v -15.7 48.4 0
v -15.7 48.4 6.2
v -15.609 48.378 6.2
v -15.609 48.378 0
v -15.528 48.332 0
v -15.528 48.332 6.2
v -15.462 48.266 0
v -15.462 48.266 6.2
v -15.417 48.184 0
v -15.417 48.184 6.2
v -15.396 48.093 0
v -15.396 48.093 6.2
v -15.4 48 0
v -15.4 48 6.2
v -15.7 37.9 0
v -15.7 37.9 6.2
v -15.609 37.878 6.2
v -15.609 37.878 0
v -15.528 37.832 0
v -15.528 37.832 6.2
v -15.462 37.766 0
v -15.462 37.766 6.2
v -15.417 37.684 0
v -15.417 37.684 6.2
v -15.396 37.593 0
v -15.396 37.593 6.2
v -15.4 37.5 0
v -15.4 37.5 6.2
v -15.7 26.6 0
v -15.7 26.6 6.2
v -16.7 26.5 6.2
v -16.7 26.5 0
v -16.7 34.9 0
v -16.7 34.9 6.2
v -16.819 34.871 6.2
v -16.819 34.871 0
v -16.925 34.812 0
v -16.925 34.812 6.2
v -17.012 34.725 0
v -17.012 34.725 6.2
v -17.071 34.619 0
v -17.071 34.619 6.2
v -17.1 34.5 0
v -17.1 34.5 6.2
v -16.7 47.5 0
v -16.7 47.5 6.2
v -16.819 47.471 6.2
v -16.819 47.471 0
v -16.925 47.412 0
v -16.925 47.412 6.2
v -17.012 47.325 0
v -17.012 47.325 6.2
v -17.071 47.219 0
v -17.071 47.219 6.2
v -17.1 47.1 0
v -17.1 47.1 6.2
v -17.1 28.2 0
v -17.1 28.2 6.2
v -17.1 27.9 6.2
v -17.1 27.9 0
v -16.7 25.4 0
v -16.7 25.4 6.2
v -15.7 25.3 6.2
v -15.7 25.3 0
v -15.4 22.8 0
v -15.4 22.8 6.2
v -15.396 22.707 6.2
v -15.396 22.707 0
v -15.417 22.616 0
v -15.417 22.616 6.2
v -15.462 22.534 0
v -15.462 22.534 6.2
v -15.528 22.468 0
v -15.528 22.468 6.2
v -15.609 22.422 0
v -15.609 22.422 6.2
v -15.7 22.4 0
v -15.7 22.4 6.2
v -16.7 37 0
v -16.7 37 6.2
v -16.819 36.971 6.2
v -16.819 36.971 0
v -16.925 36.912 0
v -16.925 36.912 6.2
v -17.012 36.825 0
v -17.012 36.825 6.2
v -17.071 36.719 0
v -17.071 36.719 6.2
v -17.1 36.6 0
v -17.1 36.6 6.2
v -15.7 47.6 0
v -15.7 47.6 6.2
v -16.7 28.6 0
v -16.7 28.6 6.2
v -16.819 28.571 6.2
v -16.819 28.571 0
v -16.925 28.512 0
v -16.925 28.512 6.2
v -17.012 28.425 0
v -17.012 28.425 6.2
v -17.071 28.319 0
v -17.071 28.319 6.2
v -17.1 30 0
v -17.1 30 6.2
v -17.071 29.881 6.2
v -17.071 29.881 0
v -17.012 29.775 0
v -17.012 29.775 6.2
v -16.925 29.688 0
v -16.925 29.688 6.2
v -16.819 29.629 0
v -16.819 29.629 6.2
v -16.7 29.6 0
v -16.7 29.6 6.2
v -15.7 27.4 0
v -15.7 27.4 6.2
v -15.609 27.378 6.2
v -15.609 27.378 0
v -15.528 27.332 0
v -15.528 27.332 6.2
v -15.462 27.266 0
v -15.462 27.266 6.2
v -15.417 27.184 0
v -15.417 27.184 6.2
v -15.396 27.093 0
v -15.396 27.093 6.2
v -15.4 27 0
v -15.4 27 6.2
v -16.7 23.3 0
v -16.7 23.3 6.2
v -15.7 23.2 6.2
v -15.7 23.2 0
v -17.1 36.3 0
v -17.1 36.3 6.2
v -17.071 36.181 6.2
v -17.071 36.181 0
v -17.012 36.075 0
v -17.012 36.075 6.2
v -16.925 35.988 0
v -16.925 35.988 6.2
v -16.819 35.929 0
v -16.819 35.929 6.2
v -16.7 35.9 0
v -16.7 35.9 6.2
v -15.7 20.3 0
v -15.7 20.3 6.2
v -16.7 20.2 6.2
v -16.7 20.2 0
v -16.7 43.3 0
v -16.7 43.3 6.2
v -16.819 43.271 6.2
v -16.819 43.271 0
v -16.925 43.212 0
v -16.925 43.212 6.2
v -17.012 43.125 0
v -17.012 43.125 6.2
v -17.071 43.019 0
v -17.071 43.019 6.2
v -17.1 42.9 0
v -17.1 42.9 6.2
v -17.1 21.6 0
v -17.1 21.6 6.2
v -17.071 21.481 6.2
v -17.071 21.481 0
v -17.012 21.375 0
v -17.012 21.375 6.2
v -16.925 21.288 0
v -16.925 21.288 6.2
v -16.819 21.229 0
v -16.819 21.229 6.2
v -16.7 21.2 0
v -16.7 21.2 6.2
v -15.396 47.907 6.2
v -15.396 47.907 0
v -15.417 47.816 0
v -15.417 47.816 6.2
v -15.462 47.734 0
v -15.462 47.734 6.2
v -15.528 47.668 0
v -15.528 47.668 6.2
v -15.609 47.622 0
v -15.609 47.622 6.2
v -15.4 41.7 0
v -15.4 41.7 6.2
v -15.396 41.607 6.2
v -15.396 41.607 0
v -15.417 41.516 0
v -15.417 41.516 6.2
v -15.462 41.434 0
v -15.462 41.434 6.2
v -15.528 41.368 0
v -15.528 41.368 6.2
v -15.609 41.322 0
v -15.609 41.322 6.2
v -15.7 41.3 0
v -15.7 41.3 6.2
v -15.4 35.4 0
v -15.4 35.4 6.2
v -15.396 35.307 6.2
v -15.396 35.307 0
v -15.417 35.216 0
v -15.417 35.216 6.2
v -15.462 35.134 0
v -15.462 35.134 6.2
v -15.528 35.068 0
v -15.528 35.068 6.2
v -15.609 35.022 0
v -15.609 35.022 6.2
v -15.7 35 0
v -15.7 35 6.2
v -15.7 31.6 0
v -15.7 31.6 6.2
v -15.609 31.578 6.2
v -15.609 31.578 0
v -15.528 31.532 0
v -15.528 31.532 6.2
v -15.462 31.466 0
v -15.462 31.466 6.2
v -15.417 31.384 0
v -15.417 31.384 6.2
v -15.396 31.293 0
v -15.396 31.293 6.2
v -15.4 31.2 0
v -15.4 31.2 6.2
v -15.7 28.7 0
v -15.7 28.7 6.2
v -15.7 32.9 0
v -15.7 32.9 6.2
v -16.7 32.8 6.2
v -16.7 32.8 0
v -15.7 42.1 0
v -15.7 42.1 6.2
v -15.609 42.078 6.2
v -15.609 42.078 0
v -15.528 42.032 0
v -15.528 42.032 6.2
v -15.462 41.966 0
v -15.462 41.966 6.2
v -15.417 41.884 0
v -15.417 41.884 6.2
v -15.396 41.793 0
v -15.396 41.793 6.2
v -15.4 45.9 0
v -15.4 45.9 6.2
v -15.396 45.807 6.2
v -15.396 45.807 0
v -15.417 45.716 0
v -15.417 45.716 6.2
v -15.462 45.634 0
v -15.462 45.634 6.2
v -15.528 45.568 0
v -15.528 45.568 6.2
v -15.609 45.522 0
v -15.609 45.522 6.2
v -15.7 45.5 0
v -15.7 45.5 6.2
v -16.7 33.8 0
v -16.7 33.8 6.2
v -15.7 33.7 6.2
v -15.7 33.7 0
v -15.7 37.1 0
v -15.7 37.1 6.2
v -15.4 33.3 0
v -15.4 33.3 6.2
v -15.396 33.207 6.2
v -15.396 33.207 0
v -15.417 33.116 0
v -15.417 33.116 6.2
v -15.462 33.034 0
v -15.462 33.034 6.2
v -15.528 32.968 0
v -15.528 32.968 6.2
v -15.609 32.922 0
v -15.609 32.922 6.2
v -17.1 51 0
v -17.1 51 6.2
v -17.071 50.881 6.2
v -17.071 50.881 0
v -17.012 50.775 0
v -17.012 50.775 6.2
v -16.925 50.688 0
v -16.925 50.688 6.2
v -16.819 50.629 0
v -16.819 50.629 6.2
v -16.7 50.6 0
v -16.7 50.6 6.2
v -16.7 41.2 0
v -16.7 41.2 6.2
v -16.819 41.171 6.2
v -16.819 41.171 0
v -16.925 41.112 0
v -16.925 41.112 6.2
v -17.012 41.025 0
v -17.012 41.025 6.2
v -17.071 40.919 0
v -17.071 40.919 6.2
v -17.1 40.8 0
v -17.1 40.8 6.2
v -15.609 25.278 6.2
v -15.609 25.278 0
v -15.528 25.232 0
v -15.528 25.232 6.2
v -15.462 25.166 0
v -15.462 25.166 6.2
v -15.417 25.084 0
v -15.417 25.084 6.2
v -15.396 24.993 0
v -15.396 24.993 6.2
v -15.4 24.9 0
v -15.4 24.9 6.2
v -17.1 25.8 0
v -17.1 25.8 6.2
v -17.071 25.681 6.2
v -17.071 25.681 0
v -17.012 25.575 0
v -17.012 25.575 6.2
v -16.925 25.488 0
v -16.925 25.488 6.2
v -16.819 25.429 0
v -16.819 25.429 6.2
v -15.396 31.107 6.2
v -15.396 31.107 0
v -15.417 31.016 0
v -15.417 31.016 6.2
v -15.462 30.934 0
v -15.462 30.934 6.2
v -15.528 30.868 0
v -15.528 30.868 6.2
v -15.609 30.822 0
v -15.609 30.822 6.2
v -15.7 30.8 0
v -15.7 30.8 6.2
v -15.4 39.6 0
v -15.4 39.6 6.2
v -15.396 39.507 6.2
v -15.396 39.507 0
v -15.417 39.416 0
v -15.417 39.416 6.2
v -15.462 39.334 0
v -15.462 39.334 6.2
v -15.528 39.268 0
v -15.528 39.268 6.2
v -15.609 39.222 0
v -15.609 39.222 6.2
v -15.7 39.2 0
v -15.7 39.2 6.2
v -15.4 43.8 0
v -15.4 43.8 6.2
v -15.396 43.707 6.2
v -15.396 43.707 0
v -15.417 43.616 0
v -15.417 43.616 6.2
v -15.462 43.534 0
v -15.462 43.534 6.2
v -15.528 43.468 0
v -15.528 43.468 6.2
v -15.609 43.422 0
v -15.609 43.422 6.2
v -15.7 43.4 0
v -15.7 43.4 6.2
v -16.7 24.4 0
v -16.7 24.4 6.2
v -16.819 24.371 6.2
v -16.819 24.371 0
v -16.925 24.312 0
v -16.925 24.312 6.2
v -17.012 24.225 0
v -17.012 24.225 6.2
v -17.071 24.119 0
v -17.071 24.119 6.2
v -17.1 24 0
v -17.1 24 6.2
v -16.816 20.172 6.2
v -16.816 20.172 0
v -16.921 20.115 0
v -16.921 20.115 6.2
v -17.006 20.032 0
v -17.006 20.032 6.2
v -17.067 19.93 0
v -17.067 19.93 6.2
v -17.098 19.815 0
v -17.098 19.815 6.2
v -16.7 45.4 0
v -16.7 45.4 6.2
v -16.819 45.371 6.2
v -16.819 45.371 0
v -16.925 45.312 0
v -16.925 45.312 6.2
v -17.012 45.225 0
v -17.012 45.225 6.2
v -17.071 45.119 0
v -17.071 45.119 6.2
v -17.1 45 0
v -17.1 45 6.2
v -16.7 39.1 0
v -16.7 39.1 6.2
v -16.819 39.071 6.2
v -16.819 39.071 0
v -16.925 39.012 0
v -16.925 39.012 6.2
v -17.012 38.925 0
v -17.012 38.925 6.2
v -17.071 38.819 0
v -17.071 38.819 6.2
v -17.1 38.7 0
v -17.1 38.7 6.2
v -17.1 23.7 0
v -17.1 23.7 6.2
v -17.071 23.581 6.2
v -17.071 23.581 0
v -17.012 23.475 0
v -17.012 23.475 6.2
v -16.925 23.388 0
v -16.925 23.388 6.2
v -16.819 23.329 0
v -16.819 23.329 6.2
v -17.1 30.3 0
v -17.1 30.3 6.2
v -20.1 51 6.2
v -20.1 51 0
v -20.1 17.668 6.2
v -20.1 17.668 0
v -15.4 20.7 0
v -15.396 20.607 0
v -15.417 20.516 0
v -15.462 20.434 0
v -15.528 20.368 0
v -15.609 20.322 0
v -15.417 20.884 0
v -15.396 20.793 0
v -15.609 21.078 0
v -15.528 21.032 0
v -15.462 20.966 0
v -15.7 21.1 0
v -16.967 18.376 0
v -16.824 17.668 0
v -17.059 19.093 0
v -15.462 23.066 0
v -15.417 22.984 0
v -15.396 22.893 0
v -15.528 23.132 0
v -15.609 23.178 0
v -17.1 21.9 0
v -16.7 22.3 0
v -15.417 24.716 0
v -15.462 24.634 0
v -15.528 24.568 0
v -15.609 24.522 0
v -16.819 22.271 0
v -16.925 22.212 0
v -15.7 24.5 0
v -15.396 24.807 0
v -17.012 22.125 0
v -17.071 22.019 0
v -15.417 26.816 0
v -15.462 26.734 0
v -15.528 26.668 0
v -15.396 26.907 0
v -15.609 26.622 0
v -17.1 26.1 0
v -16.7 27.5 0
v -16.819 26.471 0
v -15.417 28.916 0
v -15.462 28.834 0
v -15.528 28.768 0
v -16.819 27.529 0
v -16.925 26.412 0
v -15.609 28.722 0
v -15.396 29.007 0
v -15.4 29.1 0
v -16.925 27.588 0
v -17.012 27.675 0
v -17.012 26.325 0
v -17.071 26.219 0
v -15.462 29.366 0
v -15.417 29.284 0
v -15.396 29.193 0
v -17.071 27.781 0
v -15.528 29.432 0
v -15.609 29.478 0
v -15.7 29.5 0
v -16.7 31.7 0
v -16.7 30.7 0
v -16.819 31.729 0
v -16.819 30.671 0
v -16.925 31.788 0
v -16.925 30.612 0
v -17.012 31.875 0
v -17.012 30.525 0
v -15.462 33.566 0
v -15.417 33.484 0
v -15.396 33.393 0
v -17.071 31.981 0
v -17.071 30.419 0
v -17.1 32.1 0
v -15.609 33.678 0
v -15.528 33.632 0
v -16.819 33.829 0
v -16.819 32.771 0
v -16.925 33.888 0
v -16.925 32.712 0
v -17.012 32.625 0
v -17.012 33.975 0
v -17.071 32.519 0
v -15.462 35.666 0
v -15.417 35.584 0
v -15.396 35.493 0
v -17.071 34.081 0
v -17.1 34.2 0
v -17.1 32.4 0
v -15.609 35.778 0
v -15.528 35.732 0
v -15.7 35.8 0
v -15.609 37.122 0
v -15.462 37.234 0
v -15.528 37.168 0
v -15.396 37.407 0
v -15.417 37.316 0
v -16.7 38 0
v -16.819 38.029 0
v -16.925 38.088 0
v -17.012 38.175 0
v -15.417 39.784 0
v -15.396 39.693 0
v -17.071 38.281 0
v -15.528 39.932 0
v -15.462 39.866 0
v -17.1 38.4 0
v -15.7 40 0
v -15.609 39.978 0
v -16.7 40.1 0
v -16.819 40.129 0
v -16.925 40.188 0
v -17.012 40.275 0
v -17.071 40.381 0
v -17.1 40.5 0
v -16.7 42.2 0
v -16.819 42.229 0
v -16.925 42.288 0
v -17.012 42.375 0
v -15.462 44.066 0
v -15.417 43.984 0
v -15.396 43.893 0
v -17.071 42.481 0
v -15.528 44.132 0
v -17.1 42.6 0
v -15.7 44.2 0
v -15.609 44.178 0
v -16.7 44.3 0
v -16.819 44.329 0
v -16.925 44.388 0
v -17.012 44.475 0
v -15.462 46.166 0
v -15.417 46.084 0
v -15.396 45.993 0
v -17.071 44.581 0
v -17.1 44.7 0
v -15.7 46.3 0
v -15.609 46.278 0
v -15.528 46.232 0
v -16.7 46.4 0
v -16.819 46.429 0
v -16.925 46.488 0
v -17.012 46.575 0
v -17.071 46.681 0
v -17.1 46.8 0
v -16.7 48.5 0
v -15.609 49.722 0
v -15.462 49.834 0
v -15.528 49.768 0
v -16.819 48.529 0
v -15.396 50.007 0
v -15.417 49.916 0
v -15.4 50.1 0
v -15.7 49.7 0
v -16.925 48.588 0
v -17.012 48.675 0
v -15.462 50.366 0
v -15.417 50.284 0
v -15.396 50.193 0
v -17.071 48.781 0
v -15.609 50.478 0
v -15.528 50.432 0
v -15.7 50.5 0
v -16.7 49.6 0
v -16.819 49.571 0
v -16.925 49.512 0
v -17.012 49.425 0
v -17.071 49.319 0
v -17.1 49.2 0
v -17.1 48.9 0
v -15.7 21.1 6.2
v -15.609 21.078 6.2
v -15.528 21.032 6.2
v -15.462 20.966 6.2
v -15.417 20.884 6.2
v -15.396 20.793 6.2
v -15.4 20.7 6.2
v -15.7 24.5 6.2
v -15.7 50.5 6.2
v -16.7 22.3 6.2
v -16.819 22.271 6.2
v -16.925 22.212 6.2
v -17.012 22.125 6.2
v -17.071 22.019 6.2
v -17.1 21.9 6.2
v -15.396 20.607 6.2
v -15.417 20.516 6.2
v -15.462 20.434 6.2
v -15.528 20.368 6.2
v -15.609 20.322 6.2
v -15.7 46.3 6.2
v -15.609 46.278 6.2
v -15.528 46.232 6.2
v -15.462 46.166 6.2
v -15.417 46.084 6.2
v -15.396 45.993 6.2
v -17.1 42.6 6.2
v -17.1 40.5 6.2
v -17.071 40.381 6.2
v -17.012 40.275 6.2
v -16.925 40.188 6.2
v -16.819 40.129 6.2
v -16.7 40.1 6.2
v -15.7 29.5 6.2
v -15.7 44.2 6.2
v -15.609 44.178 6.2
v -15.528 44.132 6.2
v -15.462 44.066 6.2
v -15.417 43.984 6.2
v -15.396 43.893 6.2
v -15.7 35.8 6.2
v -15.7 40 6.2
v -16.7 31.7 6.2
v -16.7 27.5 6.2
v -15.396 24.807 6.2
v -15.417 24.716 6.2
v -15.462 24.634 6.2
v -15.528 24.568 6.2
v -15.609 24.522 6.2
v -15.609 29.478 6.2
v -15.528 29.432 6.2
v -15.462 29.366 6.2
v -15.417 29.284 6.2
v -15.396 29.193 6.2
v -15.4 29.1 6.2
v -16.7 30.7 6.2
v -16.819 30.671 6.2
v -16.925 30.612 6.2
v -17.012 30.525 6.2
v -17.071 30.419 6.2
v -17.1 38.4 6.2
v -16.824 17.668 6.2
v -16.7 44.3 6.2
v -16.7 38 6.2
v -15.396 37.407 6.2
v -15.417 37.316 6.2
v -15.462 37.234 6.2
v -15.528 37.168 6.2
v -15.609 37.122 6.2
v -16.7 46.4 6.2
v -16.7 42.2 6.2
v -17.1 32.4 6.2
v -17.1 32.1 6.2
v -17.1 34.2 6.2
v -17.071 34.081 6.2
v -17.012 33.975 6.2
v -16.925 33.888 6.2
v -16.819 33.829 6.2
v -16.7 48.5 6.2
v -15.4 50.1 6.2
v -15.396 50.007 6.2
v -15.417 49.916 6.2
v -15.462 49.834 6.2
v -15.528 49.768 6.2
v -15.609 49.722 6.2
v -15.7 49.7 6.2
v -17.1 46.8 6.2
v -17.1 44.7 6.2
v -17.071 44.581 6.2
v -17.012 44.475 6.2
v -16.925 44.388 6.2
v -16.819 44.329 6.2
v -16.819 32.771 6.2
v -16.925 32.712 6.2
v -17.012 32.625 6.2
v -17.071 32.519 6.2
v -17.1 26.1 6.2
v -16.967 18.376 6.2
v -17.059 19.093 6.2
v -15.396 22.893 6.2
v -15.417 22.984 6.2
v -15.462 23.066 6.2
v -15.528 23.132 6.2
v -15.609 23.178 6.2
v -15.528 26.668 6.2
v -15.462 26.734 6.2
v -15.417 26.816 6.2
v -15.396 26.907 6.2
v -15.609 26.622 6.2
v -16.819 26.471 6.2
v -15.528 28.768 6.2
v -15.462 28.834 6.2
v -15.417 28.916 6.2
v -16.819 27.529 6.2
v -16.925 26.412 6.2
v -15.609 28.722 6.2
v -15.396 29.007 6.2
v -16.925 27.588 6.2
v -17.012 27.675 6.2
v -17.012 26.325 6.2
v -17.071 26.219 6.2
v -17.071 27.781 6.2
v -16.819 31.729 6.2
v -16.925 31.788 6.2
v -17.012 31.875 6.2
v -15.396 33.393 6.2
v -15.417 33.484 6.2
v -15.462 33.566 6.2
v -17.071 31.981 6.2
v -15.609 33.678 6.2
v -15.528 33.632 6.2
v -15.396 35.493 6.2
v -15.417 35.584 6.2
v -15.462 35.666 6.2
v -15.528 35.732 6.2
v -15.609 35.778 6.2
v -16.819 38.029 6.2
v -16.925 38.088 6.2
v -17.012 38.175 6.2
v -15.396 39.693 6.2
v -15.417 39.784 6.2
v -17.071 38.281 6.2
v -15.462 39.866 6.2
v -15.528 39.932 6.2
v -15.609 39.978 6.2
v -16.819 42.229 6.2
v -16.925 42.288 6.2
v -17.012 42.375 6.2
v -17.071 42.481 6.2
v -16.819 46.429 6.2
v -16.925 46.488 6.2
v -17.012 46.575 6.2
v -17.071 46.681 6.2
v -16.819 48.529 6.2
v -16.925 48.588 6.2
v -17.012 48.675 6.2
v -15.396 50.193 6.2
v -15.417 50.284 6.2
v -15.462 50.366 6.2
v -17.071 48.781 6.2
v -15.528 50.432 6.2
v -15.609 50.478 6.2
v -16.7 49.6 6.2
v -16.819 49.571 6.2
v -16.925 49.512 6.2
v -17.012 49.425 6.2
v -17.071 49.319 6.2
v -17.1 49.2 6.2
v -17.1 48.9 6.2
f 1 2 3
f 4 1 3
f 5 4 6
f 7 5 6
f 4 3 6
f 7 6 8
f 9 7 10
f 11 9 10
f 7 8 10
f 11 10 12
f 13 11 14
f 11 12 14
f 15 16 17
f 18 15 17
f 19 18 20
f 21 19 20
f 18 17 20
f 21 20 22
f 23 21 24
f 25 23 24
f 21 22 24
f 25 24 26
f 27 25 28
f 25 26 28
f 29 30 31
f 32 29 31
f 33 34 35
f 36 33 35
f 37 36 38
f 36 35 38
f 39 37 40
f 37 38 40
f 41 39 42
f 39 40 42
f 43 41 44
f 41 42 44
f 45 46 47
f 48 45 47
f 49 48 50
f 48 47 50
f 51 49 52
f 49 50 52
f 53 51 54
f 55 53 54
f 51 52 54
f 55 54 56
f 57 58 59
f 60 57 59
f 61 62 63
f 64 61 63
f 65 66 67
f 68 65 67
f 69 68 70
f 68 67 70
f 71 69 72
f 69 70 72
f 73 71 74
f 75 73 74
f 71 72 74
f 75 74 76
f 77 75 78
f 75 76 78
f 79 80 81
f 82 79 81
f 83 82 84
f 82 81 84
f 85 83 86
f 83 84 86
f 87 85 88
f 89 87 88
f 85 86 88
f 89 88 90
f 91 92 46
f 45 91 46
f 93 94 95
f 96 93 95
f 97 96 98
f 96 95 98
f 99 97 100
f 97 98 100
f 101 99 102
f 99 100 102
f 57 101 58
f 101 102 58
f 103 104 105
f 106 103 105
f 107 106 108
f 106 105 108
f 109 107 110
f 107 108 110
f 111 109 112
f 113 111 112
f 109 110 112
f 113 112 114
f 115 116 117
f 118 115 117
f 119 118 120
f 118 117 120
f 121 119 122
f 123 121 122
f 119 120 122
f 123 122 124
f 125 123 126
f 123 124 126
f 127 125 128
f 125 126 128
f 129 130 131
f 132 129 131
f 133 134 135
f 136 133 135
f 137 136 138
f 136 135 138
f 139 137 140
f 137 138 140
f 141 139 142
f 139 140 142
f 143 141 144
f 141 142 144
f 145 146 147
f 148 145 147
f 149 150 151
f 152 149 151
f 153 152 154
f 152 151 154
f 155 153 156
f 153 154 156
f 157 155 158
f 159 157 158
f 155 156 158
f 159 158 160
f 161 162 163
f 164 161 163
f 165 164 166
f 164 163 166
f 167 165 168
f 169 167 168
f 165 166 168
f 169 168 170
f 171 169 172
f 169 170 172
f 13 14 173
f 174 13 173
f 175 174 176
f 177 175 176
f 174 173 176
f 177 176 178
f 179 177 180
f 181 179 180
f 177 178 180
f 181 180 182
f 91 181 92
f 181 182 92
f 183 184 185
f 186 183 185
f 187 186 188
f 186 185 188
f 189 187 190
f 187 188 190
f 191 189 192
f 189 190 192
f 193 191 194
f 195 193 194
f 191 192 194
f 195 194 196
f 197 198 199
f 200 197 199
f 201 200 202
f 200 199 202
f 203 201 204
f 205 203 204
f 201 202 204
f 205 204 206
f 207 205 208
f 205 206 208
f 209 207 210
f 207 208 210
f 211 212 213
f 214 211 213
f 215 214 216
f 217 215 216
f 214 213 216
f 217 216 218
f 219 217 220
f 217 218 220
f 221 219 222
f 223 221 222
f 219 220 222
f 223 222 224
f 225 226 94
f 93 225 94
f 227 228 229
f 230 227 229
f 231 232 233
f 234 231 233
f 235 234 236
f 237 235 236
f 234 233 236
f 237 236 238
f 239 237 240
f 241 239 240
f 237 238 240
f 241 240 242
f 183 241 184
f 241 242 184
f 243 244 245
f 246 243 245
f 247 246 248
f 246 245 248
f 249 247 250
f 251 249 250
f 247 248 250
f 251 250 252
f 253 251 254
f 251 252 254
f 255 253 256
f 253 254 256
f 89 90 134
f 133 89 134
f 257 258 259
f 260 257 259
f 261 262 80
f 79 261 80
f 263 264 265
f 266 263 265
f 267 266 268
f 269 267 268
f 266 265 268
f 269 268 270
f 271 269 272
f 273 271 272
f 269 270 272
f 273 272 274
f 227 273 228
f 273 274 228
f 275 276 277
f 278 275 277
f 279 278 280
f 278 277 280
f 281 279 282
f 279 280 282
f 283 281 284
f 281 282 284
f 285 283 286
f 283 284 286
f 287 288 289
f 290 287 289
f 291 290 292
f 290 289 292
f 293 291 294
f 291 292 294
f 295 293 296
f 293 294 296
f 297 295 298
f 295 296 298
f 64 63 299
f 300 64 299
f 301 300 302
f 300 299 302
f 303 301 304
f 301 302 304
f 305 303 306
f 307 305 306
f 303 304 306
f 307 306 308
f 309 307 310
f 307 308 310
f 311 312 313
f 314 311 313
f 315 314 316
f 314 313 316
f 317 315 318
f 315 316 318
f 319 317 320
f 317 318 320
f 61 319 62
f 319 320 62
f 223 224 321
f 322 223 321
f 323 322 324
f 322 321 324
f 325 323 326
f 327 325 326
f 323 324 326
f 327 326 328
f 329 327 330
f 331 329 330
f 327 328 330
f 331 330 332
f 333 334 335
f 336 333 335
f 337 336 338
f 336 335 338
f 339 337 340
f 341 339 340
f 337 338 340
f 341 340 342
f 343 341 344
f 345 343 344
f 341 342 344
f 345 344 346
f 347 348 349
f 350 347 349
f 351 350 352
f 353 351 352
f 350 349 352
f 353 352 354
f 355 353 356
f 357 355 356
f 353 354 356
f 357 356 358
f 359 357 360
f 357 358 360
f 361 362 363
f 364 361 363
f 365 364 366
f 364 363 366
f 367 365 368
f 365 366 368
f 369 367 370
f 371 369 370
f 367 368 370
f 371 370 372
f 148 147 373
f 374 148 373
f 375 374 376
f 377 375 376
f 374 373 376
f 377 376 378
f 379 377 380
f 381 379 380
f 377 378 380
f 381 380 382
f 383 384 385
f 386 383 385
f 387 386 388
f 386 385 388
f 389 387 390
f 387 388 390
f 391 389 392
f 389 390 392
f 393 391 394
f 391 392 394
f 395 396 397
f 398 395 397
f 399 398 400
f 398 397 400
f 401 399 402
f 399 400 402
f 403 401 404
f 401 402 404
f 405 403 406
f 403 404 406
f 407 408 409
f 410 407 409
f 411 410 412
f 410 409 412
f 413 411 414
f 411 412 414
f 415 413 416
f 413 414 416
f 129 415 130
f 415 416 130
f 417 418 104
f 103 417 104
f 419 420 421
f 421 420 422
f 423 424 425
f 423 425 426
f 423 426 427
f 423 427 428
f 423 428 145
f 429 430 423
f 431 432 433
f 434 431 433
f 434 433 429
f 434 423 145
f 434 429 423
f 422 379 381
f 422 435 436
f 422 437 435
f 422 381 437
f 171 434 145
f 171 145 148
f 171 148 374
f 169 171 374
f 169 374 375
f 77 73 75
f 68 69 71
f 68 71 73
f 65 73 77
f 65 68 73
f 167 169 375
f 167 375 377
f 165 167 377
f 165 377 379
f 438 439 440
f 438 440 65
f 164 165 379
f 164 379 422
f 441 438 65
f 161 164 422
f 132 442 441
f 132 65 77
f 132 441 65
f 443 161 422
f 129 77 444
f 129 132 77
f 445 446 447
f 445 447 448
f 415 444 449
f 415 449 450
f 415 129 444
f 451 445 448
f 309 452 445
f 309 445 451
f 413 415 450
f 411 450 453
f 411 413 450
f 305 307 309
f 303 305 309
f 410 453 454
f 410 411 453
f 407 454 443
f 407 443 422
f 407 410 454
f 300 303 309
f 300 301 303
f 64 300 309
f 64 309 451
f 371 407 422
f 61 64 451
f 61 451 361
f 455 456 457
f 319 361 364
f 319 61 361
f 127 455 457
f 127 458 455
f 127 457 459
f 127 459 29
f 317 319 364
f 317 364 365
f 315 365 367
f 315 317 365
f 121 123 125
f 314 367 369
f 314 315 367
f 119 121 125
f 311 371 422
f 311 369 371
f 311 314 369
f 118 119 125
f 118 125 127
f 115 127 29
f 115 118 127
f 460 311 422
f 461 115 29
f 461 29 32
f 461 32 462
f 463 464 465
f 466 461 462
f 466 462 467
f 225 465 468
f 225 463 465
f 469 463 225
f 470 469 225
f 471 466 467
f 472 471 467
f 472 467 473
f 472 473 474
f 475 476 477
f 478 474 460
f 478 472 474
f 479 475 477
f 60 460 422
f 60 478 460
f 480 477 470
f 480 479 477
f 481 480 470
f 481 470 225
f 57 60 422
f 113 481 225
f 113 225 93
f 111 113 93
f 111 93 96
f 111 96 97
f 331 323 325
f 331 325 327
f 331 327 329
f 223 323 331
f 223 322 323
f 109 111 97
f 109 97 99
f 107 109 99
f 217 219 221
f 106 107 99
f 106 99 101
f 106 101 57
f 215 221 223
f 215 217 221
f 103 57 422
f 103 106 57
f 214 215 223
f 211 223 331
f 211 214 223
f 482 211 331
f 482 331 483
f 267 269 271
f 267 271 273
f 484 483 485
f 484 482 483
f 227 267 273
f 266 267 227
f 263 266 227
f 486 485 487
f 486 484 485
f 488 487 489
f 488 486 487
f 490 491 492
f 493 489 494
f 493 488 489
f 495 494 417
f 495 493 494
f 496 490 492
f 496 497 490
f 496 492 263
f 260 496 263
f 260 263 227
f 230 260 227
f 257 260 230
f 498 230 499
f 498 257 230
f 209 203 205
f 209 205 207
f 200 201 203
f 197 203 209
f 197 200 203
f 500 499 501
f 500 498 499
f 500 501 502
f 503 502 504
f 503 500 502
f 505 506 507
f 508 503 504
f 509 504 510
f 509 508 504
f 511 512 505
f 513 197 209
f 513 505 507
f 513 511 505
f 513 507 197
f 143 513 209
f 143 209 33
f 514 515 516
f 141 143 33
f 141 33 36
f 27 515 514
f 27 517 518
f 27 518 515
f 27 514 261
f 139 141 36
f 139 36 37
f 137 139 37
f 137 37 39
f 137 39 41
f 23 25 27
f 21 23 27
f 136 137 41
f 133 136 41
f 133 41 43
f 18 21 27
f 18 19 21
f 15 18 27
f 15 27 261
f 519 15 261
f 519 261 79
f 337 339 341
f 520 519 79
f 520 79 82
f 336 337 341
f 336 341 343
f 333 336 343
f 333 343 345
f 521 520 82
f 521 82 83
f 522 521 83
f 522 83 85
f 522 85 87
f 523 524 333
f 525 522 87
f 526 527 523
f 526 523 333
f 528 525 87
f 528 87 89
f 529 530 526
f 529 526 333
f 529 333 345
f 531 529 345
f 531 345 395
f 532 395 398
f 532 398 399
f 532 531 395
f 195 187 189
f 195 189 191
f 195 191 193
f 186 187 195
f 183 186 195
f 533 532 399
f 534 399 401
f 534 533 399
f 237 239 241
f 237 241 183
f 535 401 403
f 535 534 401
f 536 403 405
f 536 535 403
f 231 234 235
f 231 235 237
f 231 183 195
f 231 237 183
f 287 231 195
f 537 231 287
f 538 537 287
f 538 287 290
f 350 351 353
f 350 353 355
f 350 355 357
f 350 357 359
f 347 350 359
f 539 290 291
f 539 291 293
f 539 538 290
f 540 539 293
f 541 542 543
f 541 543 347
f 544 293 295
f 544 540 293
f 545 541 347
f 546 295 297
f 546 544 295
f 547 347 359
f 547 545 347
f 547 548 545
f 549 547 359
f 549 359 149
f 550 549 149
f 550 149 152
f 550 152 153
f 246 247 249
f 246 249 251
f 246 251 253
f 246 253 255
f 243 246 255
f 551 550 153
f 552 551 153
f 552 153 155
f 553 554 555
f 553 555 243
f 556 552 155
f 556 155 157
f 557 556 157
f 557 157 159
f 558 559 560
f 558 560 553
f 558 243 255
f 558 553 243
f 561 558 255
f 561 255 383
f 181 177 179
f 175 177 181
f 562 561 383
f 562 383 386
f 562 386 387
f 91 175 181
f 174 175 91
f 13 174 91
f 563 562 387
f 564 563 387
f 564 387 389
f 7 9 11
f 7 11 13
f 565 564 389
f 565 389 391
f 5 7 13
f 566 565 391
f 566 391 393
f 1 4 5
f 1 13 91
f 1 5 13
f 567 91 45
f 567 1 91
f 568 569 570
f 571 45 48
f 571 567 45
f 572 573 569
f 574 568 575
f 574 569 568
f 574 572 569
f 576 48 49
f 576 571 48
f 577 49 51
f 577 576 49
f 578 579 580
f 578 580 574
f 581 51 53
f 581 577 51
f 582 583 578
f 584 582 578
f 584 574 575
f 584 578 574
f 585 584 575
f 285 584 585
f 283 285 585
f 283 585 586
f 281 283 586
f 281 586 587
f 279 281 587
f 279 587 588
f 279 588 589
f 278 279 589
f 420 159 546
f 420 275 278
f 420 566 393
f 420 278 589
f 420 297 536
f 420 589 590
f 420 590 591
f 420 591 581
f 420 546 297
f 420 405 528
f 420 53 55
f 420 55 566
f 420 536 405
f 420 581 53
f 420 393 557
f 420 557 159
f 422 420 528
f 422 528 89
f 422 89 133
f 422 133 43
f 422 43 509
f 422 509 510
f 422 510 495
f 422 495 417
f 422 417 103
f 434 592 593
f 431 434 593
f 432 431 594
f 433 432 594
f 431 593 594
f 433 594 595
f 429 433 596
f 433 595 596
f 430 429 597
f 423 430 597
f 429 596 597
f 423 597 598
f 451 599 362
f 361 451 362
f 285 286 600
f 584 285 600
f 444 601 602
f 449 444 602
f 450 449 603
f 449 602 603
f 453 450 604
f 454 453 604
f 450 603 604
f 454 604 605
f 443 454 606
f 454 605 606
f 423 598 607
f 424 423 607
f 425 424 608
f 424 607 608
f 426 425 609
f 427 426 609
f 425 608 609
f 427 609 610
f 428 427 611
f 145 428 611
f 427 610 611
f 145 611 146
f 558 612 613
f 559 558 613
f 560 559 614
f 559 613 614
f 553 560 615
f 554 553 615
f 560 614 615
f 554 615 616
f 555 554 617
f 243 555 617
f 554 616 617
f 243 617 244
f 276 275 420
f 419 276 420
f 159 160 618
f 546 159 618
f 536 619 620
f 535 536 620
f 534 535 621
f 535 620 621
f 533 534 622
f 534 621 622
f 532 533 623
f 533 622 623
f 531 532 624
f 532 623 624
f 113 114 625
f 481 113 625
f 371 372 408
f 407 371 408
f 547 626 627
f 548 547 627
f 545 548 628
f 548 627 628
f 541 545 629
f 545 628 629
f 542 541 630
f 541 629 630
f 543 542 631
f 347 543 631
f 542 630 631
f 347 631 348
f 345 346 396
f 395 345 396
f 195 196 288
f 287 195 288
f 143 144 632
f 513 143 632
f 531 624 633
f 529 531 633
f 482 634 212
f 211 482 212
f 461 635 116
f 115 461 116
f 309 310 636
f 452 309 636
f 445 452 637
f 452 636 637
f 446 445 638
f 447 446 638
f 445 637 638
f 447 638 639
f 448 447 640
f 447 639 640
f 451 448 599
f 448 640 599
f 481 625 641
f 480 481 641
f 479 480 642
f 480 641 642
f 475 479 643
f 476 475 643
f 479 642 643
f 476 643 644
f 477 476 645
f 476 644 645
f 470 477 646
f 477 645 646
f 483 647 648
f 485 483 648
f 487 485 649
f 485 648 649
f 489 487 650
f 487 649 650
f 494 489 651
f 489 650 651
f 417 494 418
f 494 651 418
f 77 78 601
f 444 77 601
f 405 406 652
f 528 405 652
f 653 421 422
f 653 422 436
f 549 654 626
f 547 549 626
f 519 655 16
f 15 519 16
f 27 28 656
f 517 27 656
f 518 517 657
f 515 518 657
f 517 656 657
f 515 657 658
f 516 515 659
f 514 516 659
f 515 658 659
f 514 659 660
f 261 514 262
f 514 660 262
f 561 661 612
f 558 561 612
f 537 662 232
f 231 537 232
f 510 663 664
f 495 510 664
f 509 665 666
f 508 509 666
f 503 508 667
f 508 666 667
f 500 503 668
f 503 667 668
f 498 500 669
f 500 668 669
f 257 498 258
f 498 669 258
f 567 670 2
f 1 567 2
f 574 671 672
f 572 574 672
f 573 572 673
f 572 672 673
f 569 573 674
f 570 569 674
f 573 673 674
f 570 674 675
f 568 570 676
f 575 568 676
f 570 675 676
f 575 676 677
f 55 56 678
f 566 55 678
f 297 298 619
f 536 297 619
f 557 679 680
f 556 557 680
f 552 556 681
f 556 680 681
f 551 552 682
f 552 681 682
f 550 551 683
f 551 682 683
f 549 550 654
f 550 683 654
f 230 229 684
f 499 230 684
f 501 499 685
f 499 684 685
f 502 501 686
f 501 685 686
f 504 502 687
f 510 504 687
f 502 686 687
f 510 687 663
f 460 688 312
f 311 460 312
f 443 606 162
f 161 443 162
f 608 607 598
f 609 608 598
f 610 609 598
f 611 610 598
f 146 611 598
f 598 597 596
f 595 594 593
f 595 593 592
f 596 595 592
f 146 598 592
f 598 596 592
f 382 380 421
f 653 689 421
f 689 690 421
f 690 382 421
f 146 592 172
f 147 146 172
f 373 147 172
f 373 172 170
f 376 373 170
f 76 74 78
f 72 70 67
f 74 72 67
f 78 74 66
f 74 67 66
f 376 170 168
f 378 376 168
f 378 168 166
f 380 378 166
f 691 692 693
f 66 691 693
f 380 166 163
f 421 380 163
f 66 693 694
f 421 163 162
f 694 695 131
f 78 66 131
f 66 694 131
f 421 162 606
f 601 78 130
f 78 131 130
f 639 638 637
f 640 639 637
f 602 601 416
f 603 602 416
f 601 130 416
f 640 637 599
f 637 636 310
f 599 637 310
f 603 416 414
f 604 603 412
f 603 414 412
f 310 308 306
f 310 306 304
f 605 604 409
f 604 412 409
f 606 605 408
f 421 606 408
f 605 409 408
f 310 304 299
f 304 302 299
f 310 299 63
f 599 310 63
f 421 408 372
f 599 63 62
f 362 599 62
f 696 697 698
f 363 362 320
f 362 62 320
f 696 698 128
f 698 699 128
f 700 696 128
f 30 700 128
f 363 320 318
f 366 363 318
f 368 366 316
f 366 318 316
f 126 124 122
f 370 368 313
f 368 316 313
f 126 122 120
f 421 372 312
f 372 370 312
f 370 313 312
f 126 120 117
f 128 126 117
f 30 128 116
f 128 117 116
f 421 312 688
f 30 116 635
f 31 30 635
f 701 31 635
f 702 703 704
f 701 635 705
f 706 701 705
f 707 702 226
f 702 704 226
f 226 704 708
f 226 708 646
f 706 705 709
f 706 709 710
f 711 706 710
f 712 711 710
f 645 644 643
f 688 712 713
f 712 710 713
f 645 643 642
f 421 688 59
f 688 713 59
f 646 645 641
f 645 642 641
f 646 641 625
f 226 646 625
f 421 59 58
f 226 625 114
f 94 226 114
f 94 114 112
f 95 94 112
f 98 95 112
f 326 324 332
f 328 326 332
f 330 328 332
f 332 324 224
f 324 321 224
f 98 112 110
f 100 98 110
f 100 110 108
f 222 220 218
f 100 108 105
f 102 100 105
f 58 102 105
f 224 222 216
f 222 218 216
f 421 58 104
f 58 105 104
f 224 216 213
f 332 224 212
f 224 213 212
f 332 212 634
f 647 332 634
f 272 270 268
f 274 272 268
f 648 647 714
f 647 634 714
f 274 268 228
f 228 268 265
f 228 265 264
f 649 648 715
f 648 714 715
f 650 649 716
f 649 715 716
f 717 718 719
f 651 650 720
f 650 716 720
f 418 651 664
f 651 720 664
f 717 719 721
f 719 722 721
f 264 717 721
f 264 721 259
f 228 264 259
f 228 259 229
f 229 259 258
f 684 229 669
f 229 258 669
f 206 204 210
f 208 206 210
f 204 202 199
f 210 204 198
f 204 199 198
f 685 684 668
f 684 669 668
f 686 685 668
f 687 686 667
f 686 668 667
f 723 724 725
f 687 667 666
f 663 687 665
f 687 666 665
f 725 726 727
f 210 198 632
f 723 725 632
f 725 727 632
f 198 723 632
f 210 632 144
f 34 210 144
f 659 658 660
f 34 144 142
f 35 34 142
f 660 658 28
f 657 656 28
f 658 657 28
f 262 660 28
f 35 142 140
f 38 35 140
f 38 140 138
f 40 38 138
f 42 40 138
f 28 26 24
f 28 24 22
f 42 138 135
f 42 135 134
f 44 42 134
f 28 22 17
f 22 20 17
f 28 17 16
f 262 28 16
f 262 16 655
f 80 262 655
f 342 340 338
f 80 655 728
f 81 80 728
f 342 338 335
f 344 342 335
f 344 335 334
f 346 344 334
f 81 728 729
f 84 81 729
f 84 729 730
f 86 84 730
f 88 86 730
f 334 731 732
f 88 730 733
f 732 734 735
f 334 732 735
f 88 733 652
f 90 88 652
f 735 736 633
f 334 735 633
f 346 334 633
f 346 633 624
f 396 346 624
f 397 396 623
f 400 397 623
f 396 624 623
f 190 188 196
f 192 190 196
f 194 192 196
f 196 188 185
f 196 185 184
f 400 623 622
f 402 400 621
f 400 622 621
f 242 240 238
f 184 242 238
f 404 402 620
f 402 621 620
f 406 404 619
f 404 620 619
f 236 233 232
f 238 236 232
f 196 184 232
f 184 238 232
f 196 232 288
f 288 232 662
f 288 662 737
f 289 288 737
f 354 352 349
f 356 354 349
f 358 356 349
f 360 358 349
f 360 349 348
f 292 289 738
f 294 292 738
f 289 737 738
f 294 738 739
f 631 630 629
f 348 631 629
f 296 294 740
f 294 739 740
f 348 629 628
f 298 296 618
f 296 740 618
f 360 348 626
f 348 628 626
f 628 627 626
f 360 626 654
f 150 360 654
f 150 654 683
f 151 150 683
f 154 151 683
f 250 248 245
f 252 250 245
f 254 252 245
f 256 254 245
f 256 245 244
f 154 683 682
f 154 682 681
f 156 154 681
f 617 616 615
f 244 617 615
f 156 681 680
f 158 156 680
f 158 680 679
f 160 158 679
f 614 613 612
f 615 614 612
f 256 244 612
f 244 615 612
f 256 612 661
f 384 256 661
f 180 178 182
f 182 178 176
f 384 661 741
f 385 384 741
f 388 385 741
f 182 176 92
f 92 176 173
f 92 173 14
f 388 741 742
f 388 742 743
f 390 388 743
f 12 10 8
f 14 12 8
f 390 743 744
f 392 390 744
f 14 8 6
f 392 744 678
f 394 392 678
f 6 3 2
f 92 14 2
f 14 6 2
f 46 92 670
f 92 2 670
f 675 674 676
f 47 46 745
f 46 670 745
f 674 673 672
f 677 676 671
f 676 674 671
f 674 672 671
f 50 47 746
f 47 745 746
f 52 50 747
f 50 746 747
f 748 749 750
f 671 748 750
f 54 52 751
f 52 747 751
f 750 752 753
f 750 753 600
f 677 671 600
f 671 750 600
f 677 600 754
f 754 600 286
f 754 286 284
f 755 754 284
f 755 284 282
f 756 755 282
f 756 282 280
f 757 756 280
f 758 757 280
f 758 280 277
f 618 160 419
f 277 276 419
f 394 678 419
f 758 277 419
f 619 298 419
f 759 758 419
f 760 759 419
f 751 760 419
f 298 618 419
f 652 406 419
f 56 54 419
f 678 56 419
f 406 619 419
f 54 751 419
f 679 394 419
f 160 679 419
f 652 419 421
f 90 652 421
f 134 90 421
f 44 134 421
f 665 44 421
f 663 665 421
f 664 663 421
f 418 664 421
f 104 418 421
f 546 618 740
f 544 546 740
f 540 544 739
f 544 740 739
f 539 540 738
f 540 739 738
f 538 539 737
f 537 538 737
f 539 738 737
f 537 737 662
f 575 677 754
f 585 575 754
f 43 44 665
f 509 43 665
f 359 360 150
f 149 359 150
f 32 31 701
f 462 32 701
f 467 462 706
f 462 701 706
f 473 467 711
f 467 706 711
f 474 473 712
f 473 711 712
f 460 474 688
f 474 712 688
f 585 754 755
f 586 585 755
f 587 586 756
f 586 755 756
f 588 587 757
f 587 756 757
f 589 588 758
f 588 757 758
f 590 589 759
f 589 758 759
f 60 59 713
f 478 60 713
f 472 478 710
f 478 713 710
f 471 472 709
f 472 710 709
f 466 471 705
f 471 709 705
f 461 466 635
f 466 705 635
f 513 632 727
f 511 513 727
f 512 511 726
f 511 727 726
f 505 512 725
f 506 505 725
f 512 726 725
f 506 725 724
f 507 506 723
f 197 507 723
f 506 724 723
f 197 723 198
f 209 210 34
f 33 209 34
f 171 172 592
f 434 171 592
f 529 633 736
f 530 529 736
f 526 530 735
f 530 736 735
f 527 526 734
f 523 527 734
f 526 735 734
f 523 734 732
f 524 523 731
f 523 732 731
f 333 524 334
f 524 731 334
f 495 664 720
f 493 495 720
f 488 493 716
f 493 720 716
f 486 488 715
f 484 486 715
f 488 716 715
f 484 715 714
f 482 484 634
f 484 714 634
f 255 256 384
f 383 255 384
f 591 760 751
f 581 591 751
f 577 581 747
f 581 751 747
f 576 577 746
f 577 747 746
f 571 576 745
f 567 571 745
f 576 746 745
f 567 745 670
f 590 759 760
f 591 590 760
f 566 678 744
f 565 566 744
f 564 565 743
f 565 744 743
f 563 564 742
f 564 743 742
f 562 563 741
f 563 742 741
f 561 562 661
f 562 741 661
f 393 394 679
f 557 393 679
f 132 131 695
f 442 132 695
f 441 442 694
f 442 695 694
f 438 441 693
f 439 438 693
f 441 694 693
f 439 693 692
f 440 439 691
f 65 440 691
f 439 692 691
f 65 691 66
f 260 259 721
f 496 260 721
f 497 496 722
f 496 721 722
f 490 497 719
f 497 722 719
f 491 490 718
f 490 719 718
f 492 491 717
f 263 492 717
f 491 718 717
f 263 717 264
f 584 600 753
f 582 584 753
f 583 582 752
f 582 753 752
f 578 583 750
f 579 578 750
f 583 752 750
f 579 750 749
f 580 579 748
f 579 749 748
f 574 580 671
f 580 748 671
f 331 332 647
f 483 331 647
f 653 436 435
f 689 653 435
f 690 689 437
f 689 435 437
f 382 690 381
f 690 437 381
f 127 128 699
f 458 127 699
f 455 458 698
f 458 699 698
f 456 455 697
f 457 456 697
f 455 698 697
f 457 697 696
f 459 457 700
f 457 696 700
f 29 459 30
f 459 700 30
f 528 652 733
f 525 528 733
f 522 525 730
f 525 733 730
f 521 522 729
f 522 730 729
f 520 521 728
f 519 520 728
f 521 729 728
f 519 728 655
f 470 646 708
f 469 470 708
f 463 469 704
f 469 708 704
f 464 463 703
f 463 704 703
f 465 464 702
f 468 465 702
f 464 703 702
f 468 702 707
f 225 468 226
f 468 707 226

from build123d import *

# Parameters (mm, degrees)
BOSS_EXTRUDE1_DEPTH     = 6.2
BOSS_EXTRUDE2_DEPTH     = 21
CHAMFER1_SIZE           = 5
CHAMFER1_SIZE2          = 28.356409098
CUT_EXTRUDE1_REACH      = 73.991
CHAMFER2_SIZE           = 1
CHAMFER2_SIZE2          = 9.514364454
CHAMFER3_SIZE           = 2
CUT_EXTRUDE2_REACH      = 78.94
CUT_EXTRUDE3_START      = -3.468867
CUT_EXTRUDE3_DEPTH      = 3.468867
BOSS_EXTRUDE3_DEPTH     = 6.2
CUT_EXTRUDE4_REACH      = 78.94
CUT_EXTRUDE5_DEPTH      = 69.523280715
CUT_EXTRUDE5_DEPTH_BACK = 69.523280715
SKETCH9_W               = 8.426821026
SKETCH9_H               = 53.817918331
CUT_EXTRUDE6_DEPTH      = 66.910958363
CUT_EXTRUDE6_DEPTH_BACK = 66.910958363
SKETCH10_W              = 41.255234225
SKETCH10_H              = 19.128366746
SKETCH11_W              = 36.809181414
SKETCH11_H              = 5.790208313
CUT_EXTRUDE7_DEPTH      = 66.910958363


with BuildPart() as part:
    # Sketch1 → Boss-Extrude1 (new body)
    with BuildSketch(Plane.XY):
        with BuildLine():
            Line((-28, 0), (0, 0))
            Line((0, 0), (0, 10))
            Line((0, 10), (-7.1, 10))
            ThreePointArc((-7.1, 10), (-14.171067812, 12.928932188), (-17.1, 20))
            Line((-17.1, 20), (-17.1, 51))
            Line((-17.1, 51), (-20.1, 51))
            Line((-20.1, 51), (-20.1, 6))
            Line((-20.1, 6), (-24, 6))
            Line((-24, 6), (-24, 50))
            Line((-24, 50), (-28, 50))
            Line((-28, 50), (-28, 0))
        make_face()
    extrude(amount=BOSS_EXTRUDE1_DEPTH)

    # Sketch2 → Boss-Extrude2 (add)
    with BuildSketch(Plane.XZ):
        Polygon((0, 6.2), (0, 10.4), (11, 10.4), (11, 42.4), (-24.1, 42.4), (-24.1, 10.4), (-13.1, 10.4), (-13.1, 6.2), align=None)
    extrude(amount=-BOSS_EXTRUDE2_DEPTH)

    # Chamfer1
    chamfer1_edges = [part.edges().sort_by_distance(p)[0] for p in [
        (-6.55, 0, 42.4),
    ]]
    chamfer1_side = [part.faces().sort_by_distance(p)[0] for p in [
        (-6.55, 10.5, 42.4),
    ]]
    chamfer(chamfer1_edges, length=CHAMFER1_SIZE, length2=CHAMFER1_SIZE2, reference=chamfer1_side[0])

    # Sketch3 → Cut-Extrude1 (cut, up to next)
    with BuildSketch(Plane(origin=(0, 0, 0), x_dir=(0, 0, -1), z_dir=(1, 0, 0)), mode=Mode.PRIVATE) as cut_extrude1_sk1:
        Polygon((-6.2, 10), (-7.6, 10), (-10.4, 21), (-6.2, 21), align=None)
    cut_extrude1_tool1 = extrude(cut_extrude1_sk1.sketch, amount=-CUT_EXTRUDE1_REACH, mode=Mode.PRIVATE) & part.part
    add(cut_extrude1_tool1.solids().sort_by_distance((0, 16.416667, 7.716667))[0], mode=Mode.SUBTRACT)

    # Chamfer2
    chamfer2_edges = [part.edges().sort_by_distance(p)[0] for p in [
        (11, 10.5, 10.4),
    ]]
    chamfer2_side = [part.faces().sort_by_distance(p)[0] for p in [
        (11, 11.541747932, 25.62778603),
    ]]
    chamfer(chamfer2_edges, length=CHAMFER2_SIZE, length2=CHAMFER2_SIZE2, reference=chamfer2_side[0])

    # Chamfer3
    chamfer3_edges = [part.edges().sort_by_distance(p)[0] for p in [
        (-24.1, 10.5, 10.4),
    ]]
    chamfer(chamfer3_edges, length=CHAMFER3_SIZE)

    # Sketch5 → Cut-Extrude2 (cut, up to next)
    with BuildSketch(Plane(origin=(11, 0, 0), x_dir=(0, 0, -1), z_dir=(1, 0, 0)), mode=Mode.PRIVATE) as cut_extrude2_sk1:
        Polygon((-42.4, 17.8), (-13.86886709, 5), (-10.966215349, -4.108657177), (-44.036924755, 0.937700744), align=None)
    cut_extrude2_tool1 = extrude(cut_extrude2_sk1.sketch, amount=-CUT_EXTRUDE2_REACH, mode=Mode.PRIVATE) & part.part
    add(cut_extrude2_tool1.solids().sort_by_distance((11, 5.258773, 29.627692))[0], mode=Mode.SUBTRACT)

    # Sketch6 → Cut-Extrude3 (cut)
    with BuildSketch(Plane(origin=(0, 0, 10.4), x_dir=(-1, 0, 0), z_dir=(0, 0, -1)).offset(CUT_EXTRUDE3_START)):
        Polygon((13.1, 0), (24.1, 5), (37.198342989, 5), (28.62602328, -4.522208447), (-13.825974113, -5.629287686), (-20.705007466, 5), (-11, 5), (0, 0), align=None)
    extrude(amount=CUT_EXTRUDE3_DEPTH, mode=Mode.SUBTRACT)

    # Sketch7 → Boss-Extrude3 (add)
    with BuildSketch(Plane.XY.offset(6.2)):
        with BuildLine():
            Line((-16.7, 50.6), (-15.7, 50.5))
            ThreePointArc((-15.7, 50.5), (-15.462165524, 50.365875857), (-15.4, 50.1))
            ThreePointArc((-15.4, 50.1), (-15.462165524, 49.834124143), (-15.7, 49.7))
            Line((-15.7, 49.7), (-16.7, 49.6))
            ThreePointArc((-16.7, 49.6), (-16.971392676, 49.471392676), (-17.1, 49.2))
            Line((-17.1, 49.2), (-17.1, 48.9))
            ThreePointArc((-17.1, 48.9), (-16.971392676, 48.628607324), (-16.7, 48.5))
            Line((-16.7, 48.5), (-15.7, 48.4))
            ThreePointArc((-15.7, 48.4), (-15.462165524, 48.265875857), (-15.4, 48))
            ThreePointArc((-15.4, 48), (-15.462165524, 47.734124143), (-15.7, 47.6))
            Line((-15.7, 47.6), (-16.7, 47.5))
            ThreePointArc((-16.7, 47.5), (-16.971392676, 47.371392676), (-17.1, 47.1))
            Line((-17.1, 47.1), (-17.1, 46.8))
            ThreePointArc((-17.1, 46.8), (-16.971392676, 46.528607324), (-16.7, 46.4))
            Line((-16.7, 46.4), (-15.7, 46.3))
            ThreePointArc((-15.7, 46.3), (-15.462165524, 46.165875857), (-15.4, 45.9))
            ThreePointArc((-15.4, 45.9), (-15.462165524, 45.634124143), (-15.7, 45.5))
            Line((-15.7, 45.5), (-16.7, 45.4))
            ThreePointArc((-16.7, 45.4), (-16.971392676, 45.271392676), (-17.1, 45))
            Line((-17.1, 45), (-17.1, 44.7))
            ThreePointArc((-17.1, 44.7), (-16.971392676, 44.428607324), (-16.7, 44.3))
            Line((-16.7, 44.3), (-15.7, 44.2))
            ThreePointArc((-15.7, 44.2), (-15.462165524, 44.065875857), (-15.4, 43.8))
            ThreePointArc((-15.4, 43.8), (-15.462165524, 43.534124143), (-15.7, 43.4))
            Line((-15.7, 43.4), (-16.7, 43.3))
            ThreePointArc((-16.7, 43.3), (-16.971392676, 43.171392676), (-17.1, 42.9))
            Line((-17.1, 42.9), (-17.1, 42.6))
            ThreePointArc((-17.1, 42.6), (-16.971392676, 42.328607324), (-16.7, 42.2))
            Line((-16.7, 42.2), (-15.7, 42.1))
            ThreePointArc((-15.7, 42.1), (-15.462165524, 41.965875857), (-15.4, 41.7))
            ThreePointArc((-15.4, 41.7), (-15.462165524, 41.434124143), (-15.7, 41.3))
            Line((-15.7, 41.3), (-16.7, 41.2))
            ThreePointArc((-16.7, 41.2), (-16.971392676, 41.071392676), (-17.1, 40.8))
            Line((-17.1, 40.8), (-17.1, 40.5))
            ThreePointArc((-17.1, 40.5), (-16.971392676, 40.228607324), (-16.7, 40.1))
            Line((-16.7, 40.1), (-15.7, 40))
            ThreePointArc((-15.7, 40), (-15.462165524, 39.865875857), (-15.4, 39.6))
            ThreePointArc((-15.4, 39.6), (-15.462165524, 39.334124143), (-15.7, 39.2))
            Line((-15.7, 39.2), (-16.7, 39.1))
            ThreePointArc((-16.7, 39.1), (-16.971392676, 38.971392676), (-17.1, 38.7))
            Line((-17.1, 38.7), (-17.1, 38.4))
            ThreePointArc((-17.1, 38.4), (-16.971392676, 38.128607324), (-16.7, 38))
            Line((-16.7, 38), (-15.7, 37.9))
            ThreePointArc((-15.7, 37.9), (-15.462165524, 37.765875857), (-15.4, 37.5))
            ThreePointArc((-15.4, 37.5), (-15.462165524, 37.234124143), (-15.7, 37.1))
            Line((-15.7, 37.1), (-16.7, 37))
            ThreePointArc((-16.7, 37), (-16.971392676, 36.871392676), (-17.1, 36.6))
            Line((-17.1, 36.6), (-17.1, 36.3))
            ThreePointArc((-17.1, 36.3), (-16.971392676, 36.028607324), (-16.7, 35.9))
            Line((-16.7, 35.9), (-15.7, 35.8))
            ThreePointArc((-15.7, 35.8), (-15.462165524, 35.665875857), (-15.4, 35.4))
            ThreePointArc((-15.4, 35.4), (-15.462165524, 35.134124143), (-15.7, 35))
            Line((-15.7, 35), (-16.7, 34.9))
            ThreePointArc((-16.7, 34.9), (-16.971392676, 34.771392676), (-17.1, 34.5))
            Line((-17.1, 34.5), (-17.1, 34.2))
            ThreePointArc((-17.1, 34.2), (-16.971392676, 33.928607324), (-16.7, 33.8))
            Line((-16.7, 33.8), (-15.7, 33.7))
            ThreePointArc((-15.7, 33.7), (-15.462165524, 33.565875857), (-15.4, 33.3))
            ThreePointArc((-15.4, 33.3), (-15.462165524, 33.034124143), (-15.7, 32.9))
            Line((-15.7, 32.9), (-16.7, 32.8))
            ThreePointArc((-16.7, 32.8), (-16.971392676, 32.671392676), (-17.1, 32.4))
            Line((-17.1, 32.4), (-17.1, 32.1))
            ThreePointArc((-17.1, 32.1), (-16.971392676, 31.828607324), (-16.7, 31.7))
            Line((-16.7, 31.7), (-15.7, 31.6))
            ThreePointArc((-15.7, 31.6), (-15.462165524, 31.465875857), (-15.4, 31.2))
            ThreePointArc((-15.4, 31.2), (-15.462165524, 30.934124143), (-15.7, 30.8))
            Line((-15.7, 30.8), (-16.7, 30.7))
            ThreePointArc((-16.7, 30.7), (-16.971392676, 30.571392676), (-17.1, 30.3))
            Line((-17.1, 30.3), (-17.1, 30))
            ThreePointArc((-17.1, 30), (-16.971392676, 29.728607324), (-16.7, 29.6))
            Line((-16.7, 29.6), (-15.7, 29.5))
            ThreePointArc((-15.7, 29.5), (-15.462165524, 29.365875857), (-15.4, 29.1))
            ThreePointArc((-15.4, 29.1), (-15.462165524, 28.834124143), (-15.7, 28.7))
            Line((-15.7, 28.7), (-16.7, 28.6))
            ThreePointArc((-16.7, 28.6), (-16.971392676, 28.471392676), (-17.1, 28.2))
            Line((-17.1, 28.2), (-17.1, 27.9))
            ThreePointArc((-17.1, 27.9), (-16.971392676, 27.628607324), (-16.7, 27.5))
            Line((-16.7, 27.5), (-15.7, 27.4))
            ThreePointArc((-15.7, 27.4), (-15.462165524, 27.265875857), (-15.4, 27))
            ThreePointArc((-15.4, 27), (-15.462165524, 26.734124143), (-15.7, 26.6))
            Line((-15.7, 26.6), (-16.7, 26.5))
            ThreePointArc((-16.7, 26.5), (-16.971392676, 26.371392676), (-17.1, 26.1))
            Line((-17.1, 26.1), (-17.1, 25.8))
            ThreePointArc((-17.1, 25.8), (-16.971392676, 25.528607324), (-16.7, 25.4))
            Line((-16.7, 25.4), (-15.7, 25.3))
            ThreePointArc((-15.7, 25.3), (-15.462165524, 25.165875857), (-15.4, 24.9))
            ThreePointArc((-15.4, 24.9), (-15.462165524, 24.634124143), (-15.7, 24.5))
            Line((-15.7, 24.5), (-16.7, 24.4))
            ThreePointArc((-16.7, 24.4), (-16.971392676, 24.271392676), (-17.1, 24))
            Line((-17.1, 24), (-17.1, 23.7))
            ThreePointArc((-17.1, 23.7), (-16.971392676, 23.428607324), (-16.7, 23.3))
            Line((-16.7, 23.3), (-15.7, 23.2))
            ThreePointArc((-15.7, 23.2), (-15.462165524, 23.065875857), (-15.4, 22.8))
            ThreePointArc((-15.4, 22.8), (-15.462165524, 22.534124143), (-15.7, 22.4))
            Line((-15.7, 22.4), (-16.7, 22.3))
            ThreePointArc((-16.7, 22.3), (-16.971392676, 22.171392676), (-17.1, 21.9))
            Line((-17.1, 21.9), (-17.1, 21.6))
            ThreePointArc((-17.1, 21.6), (-16.971392676, 21.328607324), (-16.7, 21.2))
            Line((-16.7, 21.2), (-15.7, 21.1))
            ThreePointArc((-15.7, 21.1), (-15.462165524, 20.965875857), (-15.4, 20.7))
            ThreePointArc((-15.4, 20.7), (-15.462165524, 20.434124143), (-15.7, 20.3))
            Line((-15.7, 20.3), (-16.7, 20.2))
            ThreePointArc((-16.7, 20.2), (-16.971392676, 20.071392676), (-17.1, 19.8))
            Line((-17.1, 19.8), (-17.1, 19.5))
            Line((-17.1, 19.5), (-18.637373825, 21.126261745))
            Line((-18.637373825, 21.126261745), (-18.815, 46.4))
            Line((-18.815, 46.4), (-17.1, 51))
            ThreePointArc((-17.1, 51), (-16.971392676, 50.728607324), (-16.7, 50.6))
        make_face()
    extrude(amount=-BOSS_EXTRUDE3_DEPTH)

    # Sketch8 → Cut-Extrude4 (cut, up to next)
    with BuildSketch(Plane(origin=(11, 0, 0), x_dir=(0, 0, -1), z_dir=(1, 0, 0)), mode=Mode.PRIVATE) as cut_extrude4_sk1:
        Polygon((-35.4, 21), (-27.4, 17), (-19.4, 21), align=None)
    cut_extrude4_tool1 = extrude(cut_extrude4_sk1.sketch, amount=-CUT_EXTRUDE4_REACH, mode=Mode.PRIVATE) & part.part
    add(cut_extrude4_tool1.solids().sort_by_distance((11, 19.666667, 27.4))[0], mode=Mode.SUBTRACT)

    # Sketch9 → Cut-Extrude5 (cut, two sides: drawn at the far end of the back side and taken through both)
    with BuildSketch(Plane.XY.offset(6.2).offset(-CUT_EXTRUDE5_DEPTH_BACK)):
        with Locations((-25.017603177, 24.82792225)):
            Rectangle(SKETCH9_W, SKETCH9_H)
    extrude(amount=CUT_EXTRUDE5_DEPTH + CUT_EXTRUDE5_DEPTH_BACK, mode=Mode.SUBTRACT)

    # Sketch10 → Cut-Extrude6 (cut, two sides: drawn at the far end of the back side and taken through both)
    with BuildSketch(Plane.XY.offset(6.2).offset(-CUT_EXTRUDE6_DEPTH_BACK)):
        with Locations((-9.089657701, 8.103525919)):
            Rectangle(SKETCH10_W, SKETCH10_H)
    extrude(amount=CUT_EXTRUDE6_DEPTH + CUT_EXTRUDE6_DEPTH_BACK, mode=Mode.SUBTRACT)


with BuildPart() as cut_extrude6_piece_1:
    # of the separate pieces the step leaves, piece 1, a body of its own (cut_extrude6_pieces)
    add(part.part.solids().sort_by_distance((-13.1, 17.667709292, 10.4))[0])


with BuildPart() as cut_extrude6_piece_2:
    # of the separate pieces the step leaves, piece 2, a body of its own (cut_extrude6_pieces)
    add(part.part.solids().sort_by_distance((-20.804192664, 17.667709292, 42.105124705))[0])


with BuildPart() as cut_extrude6_piece_3:
    # of the separate pieces the step leaves, piece 3, a body of its own (cut_extrude6_pieces)
    add(part.part.solids().sort_by_distance((-20.1, 51, 6.2))[0])


with BuildPart() as cut_extrude7_tool:
    # Sketch11 → Cut-Extrude7 (new, through all)
    with BuildSketch(Plane.XY.offset(6.2)):
        with Locations((-4.126622004, 18.546580197)):
            Rectangle(SKETCH11_W, SKETCH11_H)
    extrude(amount=CUT_EXTRUDE7_DEPTH)


with BuildPart() as cut_extrude6_piece_1_1:
    add(cut_extrude6_piece_1.part)

    # Cut-Extrude7: cut by cut_extrude7_tool
    add(cut_extrude7_tool.part, mode=Mode.SUBTRACT)


with BuildPart() as cut_extrude6_piece_2_1:
    add(cut_extrude6_piece_2.part)

    # Cut-Extrude7: cut by cut_extrude7_tool
    add(cut_extrude7_tool.part, mode=Mode.SUBTRACT)


solid = cut_extrude6_piece_3.part
